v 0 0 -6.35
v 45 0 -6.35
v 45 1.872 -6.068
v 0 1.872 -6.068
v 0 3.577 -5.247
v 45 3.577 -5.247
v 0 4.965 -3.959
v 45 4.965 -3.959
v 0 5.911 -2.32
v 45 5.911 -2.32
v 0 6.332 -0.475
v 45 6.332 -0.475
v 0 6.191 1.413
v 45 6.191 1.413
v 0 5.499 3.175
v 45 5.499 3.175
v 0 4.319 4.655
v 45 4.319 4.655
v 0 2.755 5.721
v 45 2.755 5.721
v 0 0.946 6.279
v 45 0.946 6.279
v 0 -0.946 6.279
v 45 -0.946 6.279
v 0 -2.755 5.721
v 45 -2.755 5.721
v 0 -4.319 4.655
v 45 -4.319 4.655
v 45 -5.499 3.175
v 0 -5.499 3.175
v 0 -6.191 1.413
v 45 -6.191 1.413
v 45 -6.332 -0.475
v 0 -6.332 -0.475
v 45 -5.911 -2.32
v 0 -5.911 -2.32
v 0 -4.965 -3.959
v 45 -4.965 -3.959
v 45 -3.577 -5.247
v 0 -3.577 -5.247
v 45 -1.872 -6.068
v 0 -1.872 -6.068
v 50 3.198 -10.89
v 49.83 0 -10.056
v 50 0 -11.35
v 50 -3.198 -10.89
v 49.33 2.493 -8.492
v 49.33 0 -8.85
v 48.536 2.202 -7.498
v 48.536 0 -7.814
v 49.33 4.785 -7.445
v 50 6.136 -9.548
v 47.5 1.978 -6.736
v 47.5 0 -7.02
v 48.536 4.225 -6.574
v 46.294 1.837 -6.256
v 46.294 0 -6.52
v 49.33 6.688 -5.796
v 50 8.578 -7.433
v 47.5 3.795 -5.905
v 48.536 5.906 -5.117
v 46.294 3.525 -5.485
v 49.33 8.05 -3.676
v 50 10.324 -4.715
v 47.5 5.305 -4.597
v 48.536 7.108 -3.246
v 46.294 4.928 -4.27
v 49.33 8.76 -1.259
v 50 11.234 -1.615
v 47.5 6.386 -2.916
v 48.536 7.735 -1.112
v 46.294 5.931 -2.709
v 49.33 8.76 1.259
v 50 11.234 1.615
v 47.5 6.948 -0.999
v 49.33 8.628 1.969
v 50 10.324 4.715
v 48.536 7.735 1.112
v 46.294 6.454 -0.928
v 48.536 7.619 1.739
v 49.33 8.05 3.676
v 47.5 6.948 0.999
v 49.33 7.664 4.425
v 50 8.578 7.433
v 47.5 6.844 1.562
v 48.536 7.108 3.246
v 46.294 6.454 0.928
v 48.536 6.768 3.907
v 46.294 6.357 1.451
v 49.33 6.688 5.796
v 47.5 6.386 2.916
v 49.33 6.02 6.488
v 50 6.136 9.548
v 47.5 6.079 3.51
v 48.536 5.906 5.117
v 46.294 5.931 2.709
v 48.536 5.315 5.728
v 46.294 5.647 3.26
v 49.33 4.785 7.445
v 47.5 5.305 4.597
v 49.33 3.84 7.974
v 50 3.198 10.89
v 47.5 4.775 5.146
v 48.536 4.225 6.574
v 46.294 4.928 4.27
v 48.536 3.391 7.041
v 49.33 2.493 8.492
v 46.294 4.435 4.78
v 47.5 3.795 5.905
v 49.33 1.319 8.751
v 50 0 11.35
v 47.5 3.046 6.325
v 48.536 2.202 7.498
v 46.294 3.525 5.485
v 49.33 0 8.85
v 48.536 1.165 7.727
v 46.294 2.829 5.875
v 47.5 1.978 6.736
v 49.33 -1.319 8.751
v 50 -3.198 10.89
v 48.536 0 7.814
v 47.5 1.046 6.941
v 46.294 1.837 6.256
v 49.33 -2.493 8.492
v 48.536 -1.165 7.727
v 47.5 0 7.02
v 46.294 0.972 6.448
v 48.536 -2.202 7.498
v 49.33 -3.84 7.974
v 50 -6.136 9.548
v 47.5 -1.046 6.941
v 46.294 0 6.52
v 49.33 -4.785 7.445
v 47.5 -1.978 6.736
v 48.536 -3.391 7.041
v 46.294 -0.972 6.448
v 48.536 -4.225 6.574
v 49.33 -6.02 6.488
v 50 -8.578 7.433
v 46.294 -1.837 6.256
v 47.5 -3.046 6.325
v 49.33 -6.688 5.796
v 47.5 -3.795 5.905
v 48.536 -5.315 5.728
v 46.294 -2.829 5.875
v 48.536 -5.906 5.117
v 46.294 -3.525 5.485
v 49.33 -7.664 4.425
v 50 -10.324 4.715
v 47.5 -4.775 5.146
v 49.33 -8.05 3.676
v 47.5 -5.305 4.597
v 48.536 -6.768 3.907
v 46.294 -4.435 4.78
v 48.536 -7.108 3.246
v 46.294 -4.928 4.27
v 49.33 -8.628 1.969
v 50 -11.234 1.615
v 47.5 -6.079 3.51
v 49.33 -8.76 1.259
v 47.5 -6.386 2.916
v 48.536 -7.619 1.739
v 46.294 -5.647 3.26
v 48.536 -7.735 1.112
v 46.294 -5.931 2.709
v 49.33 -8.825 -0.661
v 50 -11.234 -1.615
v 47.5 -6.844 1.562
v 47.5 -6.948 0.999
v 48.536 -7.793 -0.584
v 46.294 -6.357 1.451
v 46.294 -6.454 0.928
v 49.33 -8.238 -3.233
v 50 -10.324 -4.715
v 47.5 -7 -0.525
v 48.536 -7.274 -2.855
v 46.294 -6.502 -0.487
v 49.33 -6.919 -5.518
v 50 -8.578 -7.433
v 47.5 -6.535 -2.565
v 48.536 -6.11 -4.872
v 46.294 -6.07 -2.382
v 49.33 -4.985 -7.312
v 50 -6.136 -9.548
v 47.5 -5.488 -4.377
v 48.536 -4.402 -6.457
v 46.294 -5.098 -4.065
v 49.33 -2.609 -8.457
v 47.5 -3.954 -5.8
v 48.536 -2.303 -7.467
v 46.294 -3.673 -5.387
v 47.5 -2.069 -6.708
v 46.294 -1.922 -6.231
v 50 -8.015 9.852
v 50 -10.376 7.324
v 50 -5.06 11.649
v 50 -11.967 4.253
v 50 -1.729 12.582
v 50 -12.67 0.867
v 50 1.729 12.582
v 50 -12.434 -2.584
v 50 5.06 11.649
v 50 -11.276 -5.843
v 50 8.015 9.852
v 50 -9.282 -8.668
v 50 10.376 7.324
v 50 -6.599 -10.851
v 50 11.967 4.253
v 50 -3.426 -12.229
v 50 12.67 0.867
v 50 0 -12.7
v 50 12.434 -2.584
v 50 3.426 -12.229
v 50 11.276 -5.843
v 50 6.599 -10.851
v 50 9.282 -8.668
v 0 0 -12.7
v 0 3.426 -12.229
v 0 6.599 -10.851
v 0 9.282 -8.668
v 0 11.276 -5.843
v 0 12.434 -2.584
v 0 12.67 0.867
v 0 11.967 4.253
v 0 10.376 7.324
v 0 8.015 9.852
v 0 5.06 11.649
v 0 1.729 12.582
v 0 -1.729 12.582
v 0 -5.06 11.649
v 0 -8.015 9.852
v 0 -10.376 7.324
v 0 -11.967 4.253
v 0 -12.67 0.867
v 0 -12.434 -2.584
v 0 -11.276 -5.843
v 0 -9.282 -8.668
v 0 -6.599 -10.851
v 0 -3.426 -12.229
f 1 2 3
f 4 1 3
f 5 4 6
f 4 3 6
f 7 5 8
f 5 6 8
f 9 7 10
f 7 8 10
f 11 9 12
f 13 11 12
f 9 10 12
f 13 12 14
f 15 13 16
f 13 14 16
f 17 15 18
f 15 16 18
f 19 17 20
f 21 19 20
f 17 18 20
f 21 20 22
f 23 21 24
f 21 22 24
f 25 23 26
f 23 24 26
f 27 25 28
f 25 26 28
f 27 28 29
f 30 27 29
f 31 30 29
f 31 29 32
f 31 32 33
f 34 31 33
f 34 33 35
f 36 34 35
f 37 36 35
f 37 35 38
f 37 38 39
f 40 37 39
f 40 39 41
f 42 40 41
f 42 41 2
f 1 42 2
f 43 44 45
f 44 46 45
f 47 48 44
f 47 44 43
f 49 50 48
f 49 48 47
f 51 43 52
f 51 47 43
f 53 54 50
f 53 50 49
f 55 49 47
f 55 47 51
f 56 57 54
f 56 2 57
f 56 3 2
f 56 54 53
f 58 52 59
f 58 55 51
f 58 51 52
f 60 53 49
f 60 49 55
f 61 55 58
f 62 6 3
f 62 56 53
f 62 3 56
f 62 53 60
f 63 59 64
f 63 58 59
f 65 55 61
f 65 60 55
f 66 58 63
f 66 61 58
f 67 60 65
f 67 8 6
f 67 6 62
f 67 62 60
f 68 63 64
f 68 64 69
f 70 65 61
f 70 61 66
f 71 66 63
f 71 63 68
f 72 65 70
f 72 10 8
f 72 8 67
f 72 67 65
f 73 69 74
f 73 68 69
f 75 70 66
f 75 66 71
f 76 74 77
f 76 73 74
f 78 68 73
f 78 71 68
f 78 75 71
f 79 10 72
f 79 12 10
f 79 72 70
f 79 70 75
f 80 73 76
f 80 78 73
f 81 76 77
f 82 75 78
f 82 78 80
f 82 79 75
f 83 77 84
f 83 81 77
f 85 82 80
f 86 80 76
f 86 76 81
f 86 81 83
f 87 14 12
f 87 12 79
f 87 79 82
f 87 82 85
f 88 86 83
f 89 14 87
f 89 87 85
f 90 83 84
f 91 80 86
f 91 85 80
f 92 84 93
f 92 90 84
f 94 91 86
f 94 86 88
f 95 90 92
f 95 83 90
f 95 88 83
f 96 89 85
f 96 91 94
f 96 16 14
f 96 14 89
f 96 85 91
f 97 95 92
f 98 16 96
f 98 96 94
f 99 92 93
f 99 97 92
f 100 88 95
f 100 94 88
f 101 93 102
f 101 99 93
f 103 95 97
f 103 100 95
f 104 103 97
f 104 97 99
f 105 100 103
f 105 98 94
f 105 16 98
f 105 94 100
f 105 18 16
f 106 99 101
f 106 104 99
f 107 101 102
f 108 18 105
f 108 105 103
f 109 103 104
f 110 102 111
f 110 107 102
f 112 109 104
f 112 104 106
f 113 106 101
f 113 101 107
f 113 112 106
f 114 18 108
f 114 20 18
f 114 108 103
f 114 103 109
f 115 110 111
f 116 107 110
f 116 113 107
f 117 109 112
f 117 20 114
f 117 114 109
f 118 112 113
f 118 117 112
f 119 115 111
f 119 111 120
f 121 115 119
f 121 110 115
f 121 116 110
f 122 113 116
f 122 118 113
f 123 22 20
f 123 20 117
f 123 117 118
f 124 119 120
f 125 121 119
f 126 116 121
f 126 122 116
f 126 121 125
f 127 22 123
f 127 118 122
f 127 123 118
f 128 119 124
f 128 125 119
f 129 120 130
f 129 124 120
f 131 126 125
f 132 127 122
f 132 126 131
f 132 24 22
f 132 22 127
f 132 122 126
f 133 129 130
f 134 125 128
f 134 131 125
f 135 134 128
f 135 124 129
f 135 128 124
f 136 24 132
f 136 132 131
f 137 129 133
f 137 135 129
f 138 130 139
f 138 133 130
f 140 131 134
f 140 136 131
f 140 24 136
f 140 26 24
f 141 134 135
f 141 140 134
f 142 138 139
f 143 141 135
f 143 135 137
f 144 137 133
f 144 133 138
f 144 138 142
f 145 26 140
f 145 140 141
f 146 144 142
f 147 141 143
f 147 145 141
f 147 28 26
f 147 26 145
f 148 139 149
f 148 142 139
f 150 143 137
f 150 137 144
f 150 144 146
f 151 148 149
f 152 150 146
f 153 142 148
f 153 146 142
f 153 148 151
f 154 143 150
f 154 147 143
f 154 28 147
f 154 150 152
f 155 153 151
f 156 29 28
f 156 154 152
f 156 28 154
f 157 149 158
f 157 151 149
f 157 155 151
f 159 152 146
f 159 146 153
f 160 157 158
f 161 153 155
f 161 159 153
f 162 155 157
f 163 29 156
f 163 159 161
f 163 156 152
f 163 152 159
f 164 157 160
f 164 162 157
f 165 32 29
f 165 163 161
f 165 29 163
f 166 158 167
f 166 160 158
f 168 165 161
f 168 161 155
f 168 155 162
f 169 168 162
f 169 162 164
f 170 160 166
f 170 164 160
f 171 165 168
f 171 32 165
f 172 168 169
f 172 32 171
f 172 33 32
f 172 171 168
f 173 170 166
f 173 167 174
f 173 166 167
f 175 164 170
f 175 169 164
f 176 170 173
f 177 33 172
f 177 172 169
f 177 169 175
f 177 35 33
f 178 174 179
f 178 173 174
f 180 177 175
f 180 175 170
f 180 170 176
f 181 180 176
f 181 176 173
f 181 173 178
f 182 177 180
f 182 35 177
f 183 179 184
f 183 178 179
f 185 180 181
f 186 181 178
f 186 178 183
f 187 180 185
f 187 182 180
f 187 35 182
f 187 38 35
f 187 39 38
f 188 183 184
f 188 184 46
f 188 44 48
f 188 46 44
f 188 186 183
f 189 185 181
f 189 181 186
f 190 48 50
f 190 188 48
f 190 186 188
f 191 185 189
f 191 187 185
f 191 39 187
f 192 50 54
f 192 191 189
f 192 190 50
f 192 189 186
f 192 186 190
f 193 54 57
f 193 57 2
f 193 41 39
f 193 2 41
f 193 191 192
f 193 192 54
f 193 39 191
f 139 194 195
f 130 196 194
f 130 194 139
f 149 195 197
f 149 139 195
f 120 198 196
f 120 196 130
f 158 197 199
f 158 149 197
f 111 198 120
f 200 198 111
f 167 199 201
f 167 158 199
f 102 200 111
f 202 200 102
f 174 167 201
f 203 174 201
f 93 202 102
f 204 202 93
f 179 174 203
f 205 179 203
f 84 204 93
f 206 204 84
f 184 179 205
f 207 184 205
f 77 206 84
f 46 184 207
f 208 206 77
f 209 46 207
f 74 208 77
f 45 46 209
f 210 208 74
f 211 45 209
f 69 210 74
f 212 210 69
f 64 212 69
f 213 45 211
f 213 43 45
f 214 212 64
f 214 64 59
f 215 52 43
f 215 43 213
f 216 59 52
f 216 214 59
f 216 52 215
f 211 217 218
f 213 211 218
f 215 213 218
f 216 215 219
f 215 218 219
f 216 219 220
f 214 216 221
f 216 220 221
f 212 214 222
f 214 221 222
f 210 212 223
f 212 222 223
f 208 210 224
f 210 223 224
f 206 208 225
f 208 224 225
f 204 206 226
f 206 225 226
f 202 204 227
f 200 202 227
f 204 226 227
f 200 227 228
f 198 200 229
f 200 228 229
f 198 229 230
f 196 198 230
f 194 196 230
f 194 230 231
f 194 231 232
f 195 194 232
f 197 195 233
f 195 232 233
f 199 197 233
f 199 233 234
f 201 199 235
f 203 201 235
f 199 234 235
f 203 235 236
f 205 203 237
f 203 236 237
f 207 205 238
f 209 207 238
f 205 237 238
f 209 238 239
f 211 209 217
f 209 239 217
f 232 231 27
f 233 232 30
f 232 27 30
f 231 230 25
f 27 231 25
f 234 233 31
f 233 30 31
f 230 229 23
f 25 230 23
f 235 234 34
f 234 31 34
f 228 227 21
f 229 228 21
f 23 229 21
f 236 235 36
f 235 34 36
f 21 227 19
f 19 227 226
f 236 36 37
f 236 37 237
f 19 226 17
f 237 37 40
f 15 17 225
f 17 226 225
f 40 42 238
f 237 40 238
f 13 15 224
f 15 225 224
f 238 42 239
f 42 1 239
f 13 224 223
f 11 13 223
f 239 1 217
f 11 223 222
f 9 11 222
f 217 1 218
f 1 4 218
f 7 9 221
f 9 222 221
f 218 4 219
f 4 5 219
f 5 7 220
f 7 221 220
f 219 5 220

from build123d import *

# Parameters (mm, degrees)
SKETCH1_R           = 12.7
BOSS_EXTRUDE1_DEPTH = 50
SKETCH2_R           = 6.35
CUT_EXTRUDE1_DEPTH  = 51
FILLET1_R           = 5


with BuildPart() as part:
    # Sketch1 → Boss-Extrude1 (new body)
    with BuildSketch(Plane(origin=(0, 0, 0), x_dir=(0, 0, -1), z_dir=(1, 0, 0))):
        Circle(SKETCH1_R)
    extrude(amount=BOSS_EXTRUDE1_DEPTH)

    # Sketch2 → Cut-Extrude1 (cut, through all)
    with BuildSketch(Plane(origin=(50, 0, 0), x_dir=(0, 0, -1), z_dir=(1, 0, 0))):
        Circle(SKETCH2_R)
    extrude(amount=-CUT_EXTRUDE1_DEPTH, mode=Mode.SUBTRACT)

    # Fillet1
    fillet1_edges = [part.edges().sort_by_distance(p)[0] for p in [
        (50, 0, 6.35),
    ]]
    fillet(fillet1_edges, radius=FILLET1_R)


solid = part.part
